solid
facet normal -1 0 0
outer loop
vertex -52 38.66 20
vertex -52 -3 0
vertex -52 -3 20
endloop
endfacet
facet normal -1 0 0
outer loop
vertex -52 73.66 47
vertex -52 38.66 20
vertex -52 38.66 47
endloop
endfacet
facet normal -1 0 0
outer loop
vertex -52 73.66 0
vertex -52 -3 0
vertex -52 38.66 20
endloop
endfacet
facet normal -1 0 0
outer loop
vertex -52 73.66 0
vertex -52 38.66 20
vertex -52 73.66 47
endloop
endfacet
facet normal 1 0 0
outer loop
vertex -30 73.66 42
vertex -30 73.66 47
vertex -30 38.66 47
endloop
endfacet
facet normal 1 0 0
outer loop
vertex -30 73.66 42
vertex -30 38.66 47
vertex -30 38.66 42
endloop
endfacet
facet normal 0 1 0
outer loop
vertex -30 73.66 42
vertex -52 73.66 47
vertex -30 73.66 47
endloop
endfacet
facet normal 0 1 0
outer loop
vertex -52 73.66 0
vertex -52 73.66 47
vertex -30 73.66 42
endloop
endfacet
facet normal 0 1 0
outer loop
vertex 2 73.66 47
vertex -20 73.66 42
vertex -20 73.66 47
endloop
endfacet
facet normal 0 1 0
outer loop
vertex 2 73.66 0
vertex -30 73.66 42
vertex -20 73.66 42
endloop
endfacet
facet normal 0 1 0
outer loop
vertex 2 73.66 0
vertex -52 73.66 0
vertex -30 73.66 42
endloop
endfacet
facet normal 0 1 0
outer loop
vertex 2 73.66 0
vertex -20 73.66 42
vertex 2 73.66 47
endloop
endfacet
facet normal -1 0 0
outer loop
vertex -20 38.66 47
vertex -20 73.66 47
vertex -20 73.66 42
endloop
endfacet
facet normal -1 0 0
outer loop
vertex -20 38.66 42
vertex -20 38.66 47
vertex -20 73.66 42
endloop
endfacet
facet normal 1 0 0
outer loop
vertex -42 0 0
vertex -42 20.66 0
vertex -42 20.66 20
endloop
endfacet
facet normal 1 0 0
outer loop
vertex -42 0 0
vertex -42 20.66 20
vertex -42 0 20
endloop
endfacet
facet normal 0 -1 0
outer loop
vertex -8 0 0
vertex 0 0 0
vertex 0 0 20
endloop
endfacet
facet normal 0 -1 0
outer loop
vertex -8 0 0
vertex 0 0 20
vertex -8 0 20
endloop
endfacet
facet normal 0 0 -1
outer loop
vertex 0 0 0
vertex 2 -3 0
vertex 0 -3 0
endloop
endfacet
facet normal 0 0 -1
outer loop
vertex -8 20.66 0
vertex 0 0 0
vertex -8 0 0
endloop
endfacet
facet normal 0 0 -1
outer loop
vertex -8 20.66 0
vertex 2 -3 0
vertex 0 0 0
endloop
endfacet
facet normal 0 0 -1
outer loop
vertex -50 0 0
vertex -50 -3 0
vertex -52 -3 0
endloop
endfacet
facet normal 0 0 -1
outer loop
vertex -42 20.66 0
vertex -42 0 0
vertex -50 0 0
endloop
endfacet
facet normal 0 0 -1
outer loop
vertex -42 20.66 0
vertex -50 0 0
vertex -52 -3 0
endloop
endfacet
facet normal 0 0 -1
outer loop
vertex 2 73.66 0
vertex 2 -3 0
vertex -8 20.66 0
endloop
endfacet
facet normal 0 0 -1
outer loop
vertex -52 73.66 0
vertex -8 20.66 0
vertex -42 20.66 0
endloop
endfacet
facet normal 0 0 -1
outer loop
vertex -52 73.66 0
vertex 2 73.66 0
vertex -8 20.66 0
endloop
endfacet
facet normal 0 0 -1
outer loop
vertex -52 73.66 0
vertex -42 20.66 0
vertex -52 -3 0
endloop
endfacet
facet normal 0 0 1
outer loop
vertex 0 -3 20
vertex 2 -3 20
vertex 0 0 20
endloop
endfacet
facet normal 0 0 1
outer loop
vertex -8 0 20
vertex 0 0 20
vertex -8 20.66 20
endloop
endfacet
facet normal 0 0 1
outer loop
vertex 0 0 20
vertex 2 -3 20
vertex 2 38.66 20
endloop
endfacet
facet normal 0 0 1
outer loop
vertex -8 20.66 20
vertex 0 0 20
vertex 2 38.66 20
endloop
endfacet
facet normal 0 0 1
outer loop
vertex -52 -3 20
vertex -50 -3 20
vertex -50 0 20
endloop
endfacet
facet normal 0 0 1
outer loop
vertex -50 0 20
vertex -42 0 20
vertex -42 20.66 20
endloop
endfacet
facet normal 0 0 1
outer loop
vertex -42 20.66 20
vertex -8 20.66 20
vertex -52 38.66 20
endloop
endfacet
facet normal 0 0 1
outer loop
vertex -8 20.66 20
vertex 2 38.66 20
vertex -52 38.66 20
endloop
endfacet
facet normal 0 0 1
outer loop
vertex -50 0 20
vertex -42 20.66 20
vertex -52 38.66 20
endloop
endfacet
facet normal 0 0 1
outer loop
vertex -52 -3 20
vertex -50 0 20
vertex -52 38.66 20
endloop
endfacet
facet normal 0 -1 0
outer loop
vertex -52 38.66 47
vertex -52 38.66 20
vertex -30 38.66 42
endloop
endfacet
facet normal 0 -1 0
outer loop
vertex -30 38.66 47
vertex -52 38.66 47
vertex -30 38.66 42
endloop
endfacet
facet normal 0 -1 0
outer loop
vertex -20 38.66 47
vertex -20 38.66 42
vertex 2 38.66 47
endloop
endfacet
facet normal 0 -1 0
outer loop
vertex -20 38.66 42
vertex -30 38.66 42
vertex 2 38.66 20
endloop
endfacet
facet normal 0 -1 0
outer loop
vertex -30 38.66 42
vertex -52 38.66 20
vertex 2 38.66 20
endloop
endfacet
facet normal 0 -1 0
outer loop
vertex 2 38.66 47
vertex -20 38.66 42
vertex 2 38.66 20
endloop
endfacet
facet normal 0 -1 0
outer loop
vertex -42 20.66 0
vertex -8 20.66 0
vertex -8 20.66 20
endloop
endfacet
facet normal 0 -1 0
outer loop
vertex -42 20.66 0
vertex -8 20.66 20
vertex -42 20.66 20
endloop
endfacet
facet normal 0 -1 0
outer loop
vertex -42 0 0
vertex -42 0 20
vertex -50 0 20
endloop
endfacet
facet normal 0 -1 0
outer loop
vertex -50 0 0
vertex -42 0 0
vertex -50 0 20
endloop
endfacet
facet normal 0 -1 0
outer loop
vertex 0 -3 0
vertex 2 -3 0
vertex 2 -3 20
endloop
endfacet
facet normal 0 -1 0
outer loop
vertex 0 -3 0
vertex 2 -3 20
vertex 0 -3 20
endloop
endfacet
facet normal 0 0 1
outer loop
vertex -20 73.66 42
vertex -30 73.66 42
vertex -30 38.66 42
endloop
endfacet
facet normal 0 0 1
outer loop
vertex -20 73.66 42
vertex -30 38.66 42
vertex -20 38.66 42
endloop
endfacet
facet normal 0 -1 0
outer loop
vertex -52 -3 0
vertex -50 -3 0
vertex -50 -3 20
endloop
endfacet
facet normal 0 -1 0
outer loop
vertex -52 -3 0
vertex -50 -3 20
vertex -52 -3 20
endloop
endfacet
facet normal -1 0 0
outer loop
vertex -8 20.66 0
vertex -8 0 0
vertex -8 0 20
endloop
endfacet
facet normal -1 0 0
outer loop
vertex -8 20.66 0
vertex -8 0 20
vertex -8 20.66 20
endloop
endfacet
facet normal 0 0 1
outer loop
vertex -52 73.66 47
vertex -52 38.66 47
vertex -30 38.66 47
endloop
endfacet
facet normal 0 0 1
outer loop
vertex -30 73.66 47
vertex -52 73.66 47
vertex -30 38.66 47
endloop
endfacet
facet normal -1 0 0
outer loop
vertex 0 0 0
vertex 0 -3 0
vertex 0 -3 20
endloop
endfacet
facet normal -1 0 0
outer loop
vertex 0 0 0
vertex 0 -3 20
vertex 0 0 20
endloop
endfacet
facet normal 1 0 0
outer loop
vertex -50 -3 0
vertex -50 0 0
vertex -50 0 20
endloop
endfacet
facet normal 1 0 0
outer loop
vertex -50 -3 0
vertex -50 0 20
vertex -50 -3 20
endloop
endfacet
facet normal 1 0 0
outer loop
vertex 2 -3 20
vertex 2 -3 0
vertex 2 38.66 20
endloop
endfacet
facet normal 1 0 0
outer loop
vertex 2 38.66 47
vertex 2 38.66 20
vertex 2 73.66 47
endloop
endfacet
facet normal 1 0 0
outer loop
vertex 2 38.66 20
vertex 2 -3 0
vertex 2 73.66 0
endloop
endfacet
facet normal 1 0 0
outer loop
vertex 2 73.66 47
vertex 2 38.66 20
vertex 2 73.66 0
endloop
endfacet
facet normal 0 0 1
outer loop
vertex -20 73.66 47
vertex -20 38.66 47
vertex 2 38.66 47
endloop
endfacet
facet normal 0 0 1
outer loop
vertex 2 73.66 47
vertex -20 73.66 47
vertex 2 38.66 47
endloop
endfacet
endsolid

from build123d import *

# Parameters (mm, degrees)
EXTRUSION1_DEPTH = 20
ESQUISSE2_W      = 54
ESQUISSE2_H      = 35
EXTRUSION2_DEPTH = 27
ESQUISSE4_W      = 10
ESQUISSE4_H      = 5
EXTRUSION4_DEPTH = 77.66


with BuildPart() as part:
    # Esquisse1 → Extrusion1 (new body)
    with BuildSketch(Plane.XY):
        Polygon((0, 0), (-8, 0), (-8, 20.66), (-42, 20.66), (-42, 0), (-50, 0), (-50, -3), (-52, -3), (-52, 73.66), (2, 73.66), (2, -3), (0, -3), align=None)
    extrude(amount=EXTRUSION1_DEPTH)

    # Esquisse2 → Extrusion2 (add)
    with BuildSketch(Plane.XY.offset(20)):
        with Locations((-25, 56.16)):
            Rectangle(ESQUISSE2_W, ESQUISSE2_H)
    extrude(amount=EXTRUSION2_DEPTH)

    # Esquisse4 → Extrusion4 (cut, through all)
    with BuildSketch(Plane(origin=(0, 73.66, 0), x_dir=(1, 0, 0), z_dir=(0, 1, 0))):
        with Locations((-25, -44.5)):
            Rectangle(ESQUISSE4_W, ESQUISSE4_H)
    extrude(amount=-EXTRUSION4_DEPTH, mode=Mode.SUBTRACT)


solid = part.part
